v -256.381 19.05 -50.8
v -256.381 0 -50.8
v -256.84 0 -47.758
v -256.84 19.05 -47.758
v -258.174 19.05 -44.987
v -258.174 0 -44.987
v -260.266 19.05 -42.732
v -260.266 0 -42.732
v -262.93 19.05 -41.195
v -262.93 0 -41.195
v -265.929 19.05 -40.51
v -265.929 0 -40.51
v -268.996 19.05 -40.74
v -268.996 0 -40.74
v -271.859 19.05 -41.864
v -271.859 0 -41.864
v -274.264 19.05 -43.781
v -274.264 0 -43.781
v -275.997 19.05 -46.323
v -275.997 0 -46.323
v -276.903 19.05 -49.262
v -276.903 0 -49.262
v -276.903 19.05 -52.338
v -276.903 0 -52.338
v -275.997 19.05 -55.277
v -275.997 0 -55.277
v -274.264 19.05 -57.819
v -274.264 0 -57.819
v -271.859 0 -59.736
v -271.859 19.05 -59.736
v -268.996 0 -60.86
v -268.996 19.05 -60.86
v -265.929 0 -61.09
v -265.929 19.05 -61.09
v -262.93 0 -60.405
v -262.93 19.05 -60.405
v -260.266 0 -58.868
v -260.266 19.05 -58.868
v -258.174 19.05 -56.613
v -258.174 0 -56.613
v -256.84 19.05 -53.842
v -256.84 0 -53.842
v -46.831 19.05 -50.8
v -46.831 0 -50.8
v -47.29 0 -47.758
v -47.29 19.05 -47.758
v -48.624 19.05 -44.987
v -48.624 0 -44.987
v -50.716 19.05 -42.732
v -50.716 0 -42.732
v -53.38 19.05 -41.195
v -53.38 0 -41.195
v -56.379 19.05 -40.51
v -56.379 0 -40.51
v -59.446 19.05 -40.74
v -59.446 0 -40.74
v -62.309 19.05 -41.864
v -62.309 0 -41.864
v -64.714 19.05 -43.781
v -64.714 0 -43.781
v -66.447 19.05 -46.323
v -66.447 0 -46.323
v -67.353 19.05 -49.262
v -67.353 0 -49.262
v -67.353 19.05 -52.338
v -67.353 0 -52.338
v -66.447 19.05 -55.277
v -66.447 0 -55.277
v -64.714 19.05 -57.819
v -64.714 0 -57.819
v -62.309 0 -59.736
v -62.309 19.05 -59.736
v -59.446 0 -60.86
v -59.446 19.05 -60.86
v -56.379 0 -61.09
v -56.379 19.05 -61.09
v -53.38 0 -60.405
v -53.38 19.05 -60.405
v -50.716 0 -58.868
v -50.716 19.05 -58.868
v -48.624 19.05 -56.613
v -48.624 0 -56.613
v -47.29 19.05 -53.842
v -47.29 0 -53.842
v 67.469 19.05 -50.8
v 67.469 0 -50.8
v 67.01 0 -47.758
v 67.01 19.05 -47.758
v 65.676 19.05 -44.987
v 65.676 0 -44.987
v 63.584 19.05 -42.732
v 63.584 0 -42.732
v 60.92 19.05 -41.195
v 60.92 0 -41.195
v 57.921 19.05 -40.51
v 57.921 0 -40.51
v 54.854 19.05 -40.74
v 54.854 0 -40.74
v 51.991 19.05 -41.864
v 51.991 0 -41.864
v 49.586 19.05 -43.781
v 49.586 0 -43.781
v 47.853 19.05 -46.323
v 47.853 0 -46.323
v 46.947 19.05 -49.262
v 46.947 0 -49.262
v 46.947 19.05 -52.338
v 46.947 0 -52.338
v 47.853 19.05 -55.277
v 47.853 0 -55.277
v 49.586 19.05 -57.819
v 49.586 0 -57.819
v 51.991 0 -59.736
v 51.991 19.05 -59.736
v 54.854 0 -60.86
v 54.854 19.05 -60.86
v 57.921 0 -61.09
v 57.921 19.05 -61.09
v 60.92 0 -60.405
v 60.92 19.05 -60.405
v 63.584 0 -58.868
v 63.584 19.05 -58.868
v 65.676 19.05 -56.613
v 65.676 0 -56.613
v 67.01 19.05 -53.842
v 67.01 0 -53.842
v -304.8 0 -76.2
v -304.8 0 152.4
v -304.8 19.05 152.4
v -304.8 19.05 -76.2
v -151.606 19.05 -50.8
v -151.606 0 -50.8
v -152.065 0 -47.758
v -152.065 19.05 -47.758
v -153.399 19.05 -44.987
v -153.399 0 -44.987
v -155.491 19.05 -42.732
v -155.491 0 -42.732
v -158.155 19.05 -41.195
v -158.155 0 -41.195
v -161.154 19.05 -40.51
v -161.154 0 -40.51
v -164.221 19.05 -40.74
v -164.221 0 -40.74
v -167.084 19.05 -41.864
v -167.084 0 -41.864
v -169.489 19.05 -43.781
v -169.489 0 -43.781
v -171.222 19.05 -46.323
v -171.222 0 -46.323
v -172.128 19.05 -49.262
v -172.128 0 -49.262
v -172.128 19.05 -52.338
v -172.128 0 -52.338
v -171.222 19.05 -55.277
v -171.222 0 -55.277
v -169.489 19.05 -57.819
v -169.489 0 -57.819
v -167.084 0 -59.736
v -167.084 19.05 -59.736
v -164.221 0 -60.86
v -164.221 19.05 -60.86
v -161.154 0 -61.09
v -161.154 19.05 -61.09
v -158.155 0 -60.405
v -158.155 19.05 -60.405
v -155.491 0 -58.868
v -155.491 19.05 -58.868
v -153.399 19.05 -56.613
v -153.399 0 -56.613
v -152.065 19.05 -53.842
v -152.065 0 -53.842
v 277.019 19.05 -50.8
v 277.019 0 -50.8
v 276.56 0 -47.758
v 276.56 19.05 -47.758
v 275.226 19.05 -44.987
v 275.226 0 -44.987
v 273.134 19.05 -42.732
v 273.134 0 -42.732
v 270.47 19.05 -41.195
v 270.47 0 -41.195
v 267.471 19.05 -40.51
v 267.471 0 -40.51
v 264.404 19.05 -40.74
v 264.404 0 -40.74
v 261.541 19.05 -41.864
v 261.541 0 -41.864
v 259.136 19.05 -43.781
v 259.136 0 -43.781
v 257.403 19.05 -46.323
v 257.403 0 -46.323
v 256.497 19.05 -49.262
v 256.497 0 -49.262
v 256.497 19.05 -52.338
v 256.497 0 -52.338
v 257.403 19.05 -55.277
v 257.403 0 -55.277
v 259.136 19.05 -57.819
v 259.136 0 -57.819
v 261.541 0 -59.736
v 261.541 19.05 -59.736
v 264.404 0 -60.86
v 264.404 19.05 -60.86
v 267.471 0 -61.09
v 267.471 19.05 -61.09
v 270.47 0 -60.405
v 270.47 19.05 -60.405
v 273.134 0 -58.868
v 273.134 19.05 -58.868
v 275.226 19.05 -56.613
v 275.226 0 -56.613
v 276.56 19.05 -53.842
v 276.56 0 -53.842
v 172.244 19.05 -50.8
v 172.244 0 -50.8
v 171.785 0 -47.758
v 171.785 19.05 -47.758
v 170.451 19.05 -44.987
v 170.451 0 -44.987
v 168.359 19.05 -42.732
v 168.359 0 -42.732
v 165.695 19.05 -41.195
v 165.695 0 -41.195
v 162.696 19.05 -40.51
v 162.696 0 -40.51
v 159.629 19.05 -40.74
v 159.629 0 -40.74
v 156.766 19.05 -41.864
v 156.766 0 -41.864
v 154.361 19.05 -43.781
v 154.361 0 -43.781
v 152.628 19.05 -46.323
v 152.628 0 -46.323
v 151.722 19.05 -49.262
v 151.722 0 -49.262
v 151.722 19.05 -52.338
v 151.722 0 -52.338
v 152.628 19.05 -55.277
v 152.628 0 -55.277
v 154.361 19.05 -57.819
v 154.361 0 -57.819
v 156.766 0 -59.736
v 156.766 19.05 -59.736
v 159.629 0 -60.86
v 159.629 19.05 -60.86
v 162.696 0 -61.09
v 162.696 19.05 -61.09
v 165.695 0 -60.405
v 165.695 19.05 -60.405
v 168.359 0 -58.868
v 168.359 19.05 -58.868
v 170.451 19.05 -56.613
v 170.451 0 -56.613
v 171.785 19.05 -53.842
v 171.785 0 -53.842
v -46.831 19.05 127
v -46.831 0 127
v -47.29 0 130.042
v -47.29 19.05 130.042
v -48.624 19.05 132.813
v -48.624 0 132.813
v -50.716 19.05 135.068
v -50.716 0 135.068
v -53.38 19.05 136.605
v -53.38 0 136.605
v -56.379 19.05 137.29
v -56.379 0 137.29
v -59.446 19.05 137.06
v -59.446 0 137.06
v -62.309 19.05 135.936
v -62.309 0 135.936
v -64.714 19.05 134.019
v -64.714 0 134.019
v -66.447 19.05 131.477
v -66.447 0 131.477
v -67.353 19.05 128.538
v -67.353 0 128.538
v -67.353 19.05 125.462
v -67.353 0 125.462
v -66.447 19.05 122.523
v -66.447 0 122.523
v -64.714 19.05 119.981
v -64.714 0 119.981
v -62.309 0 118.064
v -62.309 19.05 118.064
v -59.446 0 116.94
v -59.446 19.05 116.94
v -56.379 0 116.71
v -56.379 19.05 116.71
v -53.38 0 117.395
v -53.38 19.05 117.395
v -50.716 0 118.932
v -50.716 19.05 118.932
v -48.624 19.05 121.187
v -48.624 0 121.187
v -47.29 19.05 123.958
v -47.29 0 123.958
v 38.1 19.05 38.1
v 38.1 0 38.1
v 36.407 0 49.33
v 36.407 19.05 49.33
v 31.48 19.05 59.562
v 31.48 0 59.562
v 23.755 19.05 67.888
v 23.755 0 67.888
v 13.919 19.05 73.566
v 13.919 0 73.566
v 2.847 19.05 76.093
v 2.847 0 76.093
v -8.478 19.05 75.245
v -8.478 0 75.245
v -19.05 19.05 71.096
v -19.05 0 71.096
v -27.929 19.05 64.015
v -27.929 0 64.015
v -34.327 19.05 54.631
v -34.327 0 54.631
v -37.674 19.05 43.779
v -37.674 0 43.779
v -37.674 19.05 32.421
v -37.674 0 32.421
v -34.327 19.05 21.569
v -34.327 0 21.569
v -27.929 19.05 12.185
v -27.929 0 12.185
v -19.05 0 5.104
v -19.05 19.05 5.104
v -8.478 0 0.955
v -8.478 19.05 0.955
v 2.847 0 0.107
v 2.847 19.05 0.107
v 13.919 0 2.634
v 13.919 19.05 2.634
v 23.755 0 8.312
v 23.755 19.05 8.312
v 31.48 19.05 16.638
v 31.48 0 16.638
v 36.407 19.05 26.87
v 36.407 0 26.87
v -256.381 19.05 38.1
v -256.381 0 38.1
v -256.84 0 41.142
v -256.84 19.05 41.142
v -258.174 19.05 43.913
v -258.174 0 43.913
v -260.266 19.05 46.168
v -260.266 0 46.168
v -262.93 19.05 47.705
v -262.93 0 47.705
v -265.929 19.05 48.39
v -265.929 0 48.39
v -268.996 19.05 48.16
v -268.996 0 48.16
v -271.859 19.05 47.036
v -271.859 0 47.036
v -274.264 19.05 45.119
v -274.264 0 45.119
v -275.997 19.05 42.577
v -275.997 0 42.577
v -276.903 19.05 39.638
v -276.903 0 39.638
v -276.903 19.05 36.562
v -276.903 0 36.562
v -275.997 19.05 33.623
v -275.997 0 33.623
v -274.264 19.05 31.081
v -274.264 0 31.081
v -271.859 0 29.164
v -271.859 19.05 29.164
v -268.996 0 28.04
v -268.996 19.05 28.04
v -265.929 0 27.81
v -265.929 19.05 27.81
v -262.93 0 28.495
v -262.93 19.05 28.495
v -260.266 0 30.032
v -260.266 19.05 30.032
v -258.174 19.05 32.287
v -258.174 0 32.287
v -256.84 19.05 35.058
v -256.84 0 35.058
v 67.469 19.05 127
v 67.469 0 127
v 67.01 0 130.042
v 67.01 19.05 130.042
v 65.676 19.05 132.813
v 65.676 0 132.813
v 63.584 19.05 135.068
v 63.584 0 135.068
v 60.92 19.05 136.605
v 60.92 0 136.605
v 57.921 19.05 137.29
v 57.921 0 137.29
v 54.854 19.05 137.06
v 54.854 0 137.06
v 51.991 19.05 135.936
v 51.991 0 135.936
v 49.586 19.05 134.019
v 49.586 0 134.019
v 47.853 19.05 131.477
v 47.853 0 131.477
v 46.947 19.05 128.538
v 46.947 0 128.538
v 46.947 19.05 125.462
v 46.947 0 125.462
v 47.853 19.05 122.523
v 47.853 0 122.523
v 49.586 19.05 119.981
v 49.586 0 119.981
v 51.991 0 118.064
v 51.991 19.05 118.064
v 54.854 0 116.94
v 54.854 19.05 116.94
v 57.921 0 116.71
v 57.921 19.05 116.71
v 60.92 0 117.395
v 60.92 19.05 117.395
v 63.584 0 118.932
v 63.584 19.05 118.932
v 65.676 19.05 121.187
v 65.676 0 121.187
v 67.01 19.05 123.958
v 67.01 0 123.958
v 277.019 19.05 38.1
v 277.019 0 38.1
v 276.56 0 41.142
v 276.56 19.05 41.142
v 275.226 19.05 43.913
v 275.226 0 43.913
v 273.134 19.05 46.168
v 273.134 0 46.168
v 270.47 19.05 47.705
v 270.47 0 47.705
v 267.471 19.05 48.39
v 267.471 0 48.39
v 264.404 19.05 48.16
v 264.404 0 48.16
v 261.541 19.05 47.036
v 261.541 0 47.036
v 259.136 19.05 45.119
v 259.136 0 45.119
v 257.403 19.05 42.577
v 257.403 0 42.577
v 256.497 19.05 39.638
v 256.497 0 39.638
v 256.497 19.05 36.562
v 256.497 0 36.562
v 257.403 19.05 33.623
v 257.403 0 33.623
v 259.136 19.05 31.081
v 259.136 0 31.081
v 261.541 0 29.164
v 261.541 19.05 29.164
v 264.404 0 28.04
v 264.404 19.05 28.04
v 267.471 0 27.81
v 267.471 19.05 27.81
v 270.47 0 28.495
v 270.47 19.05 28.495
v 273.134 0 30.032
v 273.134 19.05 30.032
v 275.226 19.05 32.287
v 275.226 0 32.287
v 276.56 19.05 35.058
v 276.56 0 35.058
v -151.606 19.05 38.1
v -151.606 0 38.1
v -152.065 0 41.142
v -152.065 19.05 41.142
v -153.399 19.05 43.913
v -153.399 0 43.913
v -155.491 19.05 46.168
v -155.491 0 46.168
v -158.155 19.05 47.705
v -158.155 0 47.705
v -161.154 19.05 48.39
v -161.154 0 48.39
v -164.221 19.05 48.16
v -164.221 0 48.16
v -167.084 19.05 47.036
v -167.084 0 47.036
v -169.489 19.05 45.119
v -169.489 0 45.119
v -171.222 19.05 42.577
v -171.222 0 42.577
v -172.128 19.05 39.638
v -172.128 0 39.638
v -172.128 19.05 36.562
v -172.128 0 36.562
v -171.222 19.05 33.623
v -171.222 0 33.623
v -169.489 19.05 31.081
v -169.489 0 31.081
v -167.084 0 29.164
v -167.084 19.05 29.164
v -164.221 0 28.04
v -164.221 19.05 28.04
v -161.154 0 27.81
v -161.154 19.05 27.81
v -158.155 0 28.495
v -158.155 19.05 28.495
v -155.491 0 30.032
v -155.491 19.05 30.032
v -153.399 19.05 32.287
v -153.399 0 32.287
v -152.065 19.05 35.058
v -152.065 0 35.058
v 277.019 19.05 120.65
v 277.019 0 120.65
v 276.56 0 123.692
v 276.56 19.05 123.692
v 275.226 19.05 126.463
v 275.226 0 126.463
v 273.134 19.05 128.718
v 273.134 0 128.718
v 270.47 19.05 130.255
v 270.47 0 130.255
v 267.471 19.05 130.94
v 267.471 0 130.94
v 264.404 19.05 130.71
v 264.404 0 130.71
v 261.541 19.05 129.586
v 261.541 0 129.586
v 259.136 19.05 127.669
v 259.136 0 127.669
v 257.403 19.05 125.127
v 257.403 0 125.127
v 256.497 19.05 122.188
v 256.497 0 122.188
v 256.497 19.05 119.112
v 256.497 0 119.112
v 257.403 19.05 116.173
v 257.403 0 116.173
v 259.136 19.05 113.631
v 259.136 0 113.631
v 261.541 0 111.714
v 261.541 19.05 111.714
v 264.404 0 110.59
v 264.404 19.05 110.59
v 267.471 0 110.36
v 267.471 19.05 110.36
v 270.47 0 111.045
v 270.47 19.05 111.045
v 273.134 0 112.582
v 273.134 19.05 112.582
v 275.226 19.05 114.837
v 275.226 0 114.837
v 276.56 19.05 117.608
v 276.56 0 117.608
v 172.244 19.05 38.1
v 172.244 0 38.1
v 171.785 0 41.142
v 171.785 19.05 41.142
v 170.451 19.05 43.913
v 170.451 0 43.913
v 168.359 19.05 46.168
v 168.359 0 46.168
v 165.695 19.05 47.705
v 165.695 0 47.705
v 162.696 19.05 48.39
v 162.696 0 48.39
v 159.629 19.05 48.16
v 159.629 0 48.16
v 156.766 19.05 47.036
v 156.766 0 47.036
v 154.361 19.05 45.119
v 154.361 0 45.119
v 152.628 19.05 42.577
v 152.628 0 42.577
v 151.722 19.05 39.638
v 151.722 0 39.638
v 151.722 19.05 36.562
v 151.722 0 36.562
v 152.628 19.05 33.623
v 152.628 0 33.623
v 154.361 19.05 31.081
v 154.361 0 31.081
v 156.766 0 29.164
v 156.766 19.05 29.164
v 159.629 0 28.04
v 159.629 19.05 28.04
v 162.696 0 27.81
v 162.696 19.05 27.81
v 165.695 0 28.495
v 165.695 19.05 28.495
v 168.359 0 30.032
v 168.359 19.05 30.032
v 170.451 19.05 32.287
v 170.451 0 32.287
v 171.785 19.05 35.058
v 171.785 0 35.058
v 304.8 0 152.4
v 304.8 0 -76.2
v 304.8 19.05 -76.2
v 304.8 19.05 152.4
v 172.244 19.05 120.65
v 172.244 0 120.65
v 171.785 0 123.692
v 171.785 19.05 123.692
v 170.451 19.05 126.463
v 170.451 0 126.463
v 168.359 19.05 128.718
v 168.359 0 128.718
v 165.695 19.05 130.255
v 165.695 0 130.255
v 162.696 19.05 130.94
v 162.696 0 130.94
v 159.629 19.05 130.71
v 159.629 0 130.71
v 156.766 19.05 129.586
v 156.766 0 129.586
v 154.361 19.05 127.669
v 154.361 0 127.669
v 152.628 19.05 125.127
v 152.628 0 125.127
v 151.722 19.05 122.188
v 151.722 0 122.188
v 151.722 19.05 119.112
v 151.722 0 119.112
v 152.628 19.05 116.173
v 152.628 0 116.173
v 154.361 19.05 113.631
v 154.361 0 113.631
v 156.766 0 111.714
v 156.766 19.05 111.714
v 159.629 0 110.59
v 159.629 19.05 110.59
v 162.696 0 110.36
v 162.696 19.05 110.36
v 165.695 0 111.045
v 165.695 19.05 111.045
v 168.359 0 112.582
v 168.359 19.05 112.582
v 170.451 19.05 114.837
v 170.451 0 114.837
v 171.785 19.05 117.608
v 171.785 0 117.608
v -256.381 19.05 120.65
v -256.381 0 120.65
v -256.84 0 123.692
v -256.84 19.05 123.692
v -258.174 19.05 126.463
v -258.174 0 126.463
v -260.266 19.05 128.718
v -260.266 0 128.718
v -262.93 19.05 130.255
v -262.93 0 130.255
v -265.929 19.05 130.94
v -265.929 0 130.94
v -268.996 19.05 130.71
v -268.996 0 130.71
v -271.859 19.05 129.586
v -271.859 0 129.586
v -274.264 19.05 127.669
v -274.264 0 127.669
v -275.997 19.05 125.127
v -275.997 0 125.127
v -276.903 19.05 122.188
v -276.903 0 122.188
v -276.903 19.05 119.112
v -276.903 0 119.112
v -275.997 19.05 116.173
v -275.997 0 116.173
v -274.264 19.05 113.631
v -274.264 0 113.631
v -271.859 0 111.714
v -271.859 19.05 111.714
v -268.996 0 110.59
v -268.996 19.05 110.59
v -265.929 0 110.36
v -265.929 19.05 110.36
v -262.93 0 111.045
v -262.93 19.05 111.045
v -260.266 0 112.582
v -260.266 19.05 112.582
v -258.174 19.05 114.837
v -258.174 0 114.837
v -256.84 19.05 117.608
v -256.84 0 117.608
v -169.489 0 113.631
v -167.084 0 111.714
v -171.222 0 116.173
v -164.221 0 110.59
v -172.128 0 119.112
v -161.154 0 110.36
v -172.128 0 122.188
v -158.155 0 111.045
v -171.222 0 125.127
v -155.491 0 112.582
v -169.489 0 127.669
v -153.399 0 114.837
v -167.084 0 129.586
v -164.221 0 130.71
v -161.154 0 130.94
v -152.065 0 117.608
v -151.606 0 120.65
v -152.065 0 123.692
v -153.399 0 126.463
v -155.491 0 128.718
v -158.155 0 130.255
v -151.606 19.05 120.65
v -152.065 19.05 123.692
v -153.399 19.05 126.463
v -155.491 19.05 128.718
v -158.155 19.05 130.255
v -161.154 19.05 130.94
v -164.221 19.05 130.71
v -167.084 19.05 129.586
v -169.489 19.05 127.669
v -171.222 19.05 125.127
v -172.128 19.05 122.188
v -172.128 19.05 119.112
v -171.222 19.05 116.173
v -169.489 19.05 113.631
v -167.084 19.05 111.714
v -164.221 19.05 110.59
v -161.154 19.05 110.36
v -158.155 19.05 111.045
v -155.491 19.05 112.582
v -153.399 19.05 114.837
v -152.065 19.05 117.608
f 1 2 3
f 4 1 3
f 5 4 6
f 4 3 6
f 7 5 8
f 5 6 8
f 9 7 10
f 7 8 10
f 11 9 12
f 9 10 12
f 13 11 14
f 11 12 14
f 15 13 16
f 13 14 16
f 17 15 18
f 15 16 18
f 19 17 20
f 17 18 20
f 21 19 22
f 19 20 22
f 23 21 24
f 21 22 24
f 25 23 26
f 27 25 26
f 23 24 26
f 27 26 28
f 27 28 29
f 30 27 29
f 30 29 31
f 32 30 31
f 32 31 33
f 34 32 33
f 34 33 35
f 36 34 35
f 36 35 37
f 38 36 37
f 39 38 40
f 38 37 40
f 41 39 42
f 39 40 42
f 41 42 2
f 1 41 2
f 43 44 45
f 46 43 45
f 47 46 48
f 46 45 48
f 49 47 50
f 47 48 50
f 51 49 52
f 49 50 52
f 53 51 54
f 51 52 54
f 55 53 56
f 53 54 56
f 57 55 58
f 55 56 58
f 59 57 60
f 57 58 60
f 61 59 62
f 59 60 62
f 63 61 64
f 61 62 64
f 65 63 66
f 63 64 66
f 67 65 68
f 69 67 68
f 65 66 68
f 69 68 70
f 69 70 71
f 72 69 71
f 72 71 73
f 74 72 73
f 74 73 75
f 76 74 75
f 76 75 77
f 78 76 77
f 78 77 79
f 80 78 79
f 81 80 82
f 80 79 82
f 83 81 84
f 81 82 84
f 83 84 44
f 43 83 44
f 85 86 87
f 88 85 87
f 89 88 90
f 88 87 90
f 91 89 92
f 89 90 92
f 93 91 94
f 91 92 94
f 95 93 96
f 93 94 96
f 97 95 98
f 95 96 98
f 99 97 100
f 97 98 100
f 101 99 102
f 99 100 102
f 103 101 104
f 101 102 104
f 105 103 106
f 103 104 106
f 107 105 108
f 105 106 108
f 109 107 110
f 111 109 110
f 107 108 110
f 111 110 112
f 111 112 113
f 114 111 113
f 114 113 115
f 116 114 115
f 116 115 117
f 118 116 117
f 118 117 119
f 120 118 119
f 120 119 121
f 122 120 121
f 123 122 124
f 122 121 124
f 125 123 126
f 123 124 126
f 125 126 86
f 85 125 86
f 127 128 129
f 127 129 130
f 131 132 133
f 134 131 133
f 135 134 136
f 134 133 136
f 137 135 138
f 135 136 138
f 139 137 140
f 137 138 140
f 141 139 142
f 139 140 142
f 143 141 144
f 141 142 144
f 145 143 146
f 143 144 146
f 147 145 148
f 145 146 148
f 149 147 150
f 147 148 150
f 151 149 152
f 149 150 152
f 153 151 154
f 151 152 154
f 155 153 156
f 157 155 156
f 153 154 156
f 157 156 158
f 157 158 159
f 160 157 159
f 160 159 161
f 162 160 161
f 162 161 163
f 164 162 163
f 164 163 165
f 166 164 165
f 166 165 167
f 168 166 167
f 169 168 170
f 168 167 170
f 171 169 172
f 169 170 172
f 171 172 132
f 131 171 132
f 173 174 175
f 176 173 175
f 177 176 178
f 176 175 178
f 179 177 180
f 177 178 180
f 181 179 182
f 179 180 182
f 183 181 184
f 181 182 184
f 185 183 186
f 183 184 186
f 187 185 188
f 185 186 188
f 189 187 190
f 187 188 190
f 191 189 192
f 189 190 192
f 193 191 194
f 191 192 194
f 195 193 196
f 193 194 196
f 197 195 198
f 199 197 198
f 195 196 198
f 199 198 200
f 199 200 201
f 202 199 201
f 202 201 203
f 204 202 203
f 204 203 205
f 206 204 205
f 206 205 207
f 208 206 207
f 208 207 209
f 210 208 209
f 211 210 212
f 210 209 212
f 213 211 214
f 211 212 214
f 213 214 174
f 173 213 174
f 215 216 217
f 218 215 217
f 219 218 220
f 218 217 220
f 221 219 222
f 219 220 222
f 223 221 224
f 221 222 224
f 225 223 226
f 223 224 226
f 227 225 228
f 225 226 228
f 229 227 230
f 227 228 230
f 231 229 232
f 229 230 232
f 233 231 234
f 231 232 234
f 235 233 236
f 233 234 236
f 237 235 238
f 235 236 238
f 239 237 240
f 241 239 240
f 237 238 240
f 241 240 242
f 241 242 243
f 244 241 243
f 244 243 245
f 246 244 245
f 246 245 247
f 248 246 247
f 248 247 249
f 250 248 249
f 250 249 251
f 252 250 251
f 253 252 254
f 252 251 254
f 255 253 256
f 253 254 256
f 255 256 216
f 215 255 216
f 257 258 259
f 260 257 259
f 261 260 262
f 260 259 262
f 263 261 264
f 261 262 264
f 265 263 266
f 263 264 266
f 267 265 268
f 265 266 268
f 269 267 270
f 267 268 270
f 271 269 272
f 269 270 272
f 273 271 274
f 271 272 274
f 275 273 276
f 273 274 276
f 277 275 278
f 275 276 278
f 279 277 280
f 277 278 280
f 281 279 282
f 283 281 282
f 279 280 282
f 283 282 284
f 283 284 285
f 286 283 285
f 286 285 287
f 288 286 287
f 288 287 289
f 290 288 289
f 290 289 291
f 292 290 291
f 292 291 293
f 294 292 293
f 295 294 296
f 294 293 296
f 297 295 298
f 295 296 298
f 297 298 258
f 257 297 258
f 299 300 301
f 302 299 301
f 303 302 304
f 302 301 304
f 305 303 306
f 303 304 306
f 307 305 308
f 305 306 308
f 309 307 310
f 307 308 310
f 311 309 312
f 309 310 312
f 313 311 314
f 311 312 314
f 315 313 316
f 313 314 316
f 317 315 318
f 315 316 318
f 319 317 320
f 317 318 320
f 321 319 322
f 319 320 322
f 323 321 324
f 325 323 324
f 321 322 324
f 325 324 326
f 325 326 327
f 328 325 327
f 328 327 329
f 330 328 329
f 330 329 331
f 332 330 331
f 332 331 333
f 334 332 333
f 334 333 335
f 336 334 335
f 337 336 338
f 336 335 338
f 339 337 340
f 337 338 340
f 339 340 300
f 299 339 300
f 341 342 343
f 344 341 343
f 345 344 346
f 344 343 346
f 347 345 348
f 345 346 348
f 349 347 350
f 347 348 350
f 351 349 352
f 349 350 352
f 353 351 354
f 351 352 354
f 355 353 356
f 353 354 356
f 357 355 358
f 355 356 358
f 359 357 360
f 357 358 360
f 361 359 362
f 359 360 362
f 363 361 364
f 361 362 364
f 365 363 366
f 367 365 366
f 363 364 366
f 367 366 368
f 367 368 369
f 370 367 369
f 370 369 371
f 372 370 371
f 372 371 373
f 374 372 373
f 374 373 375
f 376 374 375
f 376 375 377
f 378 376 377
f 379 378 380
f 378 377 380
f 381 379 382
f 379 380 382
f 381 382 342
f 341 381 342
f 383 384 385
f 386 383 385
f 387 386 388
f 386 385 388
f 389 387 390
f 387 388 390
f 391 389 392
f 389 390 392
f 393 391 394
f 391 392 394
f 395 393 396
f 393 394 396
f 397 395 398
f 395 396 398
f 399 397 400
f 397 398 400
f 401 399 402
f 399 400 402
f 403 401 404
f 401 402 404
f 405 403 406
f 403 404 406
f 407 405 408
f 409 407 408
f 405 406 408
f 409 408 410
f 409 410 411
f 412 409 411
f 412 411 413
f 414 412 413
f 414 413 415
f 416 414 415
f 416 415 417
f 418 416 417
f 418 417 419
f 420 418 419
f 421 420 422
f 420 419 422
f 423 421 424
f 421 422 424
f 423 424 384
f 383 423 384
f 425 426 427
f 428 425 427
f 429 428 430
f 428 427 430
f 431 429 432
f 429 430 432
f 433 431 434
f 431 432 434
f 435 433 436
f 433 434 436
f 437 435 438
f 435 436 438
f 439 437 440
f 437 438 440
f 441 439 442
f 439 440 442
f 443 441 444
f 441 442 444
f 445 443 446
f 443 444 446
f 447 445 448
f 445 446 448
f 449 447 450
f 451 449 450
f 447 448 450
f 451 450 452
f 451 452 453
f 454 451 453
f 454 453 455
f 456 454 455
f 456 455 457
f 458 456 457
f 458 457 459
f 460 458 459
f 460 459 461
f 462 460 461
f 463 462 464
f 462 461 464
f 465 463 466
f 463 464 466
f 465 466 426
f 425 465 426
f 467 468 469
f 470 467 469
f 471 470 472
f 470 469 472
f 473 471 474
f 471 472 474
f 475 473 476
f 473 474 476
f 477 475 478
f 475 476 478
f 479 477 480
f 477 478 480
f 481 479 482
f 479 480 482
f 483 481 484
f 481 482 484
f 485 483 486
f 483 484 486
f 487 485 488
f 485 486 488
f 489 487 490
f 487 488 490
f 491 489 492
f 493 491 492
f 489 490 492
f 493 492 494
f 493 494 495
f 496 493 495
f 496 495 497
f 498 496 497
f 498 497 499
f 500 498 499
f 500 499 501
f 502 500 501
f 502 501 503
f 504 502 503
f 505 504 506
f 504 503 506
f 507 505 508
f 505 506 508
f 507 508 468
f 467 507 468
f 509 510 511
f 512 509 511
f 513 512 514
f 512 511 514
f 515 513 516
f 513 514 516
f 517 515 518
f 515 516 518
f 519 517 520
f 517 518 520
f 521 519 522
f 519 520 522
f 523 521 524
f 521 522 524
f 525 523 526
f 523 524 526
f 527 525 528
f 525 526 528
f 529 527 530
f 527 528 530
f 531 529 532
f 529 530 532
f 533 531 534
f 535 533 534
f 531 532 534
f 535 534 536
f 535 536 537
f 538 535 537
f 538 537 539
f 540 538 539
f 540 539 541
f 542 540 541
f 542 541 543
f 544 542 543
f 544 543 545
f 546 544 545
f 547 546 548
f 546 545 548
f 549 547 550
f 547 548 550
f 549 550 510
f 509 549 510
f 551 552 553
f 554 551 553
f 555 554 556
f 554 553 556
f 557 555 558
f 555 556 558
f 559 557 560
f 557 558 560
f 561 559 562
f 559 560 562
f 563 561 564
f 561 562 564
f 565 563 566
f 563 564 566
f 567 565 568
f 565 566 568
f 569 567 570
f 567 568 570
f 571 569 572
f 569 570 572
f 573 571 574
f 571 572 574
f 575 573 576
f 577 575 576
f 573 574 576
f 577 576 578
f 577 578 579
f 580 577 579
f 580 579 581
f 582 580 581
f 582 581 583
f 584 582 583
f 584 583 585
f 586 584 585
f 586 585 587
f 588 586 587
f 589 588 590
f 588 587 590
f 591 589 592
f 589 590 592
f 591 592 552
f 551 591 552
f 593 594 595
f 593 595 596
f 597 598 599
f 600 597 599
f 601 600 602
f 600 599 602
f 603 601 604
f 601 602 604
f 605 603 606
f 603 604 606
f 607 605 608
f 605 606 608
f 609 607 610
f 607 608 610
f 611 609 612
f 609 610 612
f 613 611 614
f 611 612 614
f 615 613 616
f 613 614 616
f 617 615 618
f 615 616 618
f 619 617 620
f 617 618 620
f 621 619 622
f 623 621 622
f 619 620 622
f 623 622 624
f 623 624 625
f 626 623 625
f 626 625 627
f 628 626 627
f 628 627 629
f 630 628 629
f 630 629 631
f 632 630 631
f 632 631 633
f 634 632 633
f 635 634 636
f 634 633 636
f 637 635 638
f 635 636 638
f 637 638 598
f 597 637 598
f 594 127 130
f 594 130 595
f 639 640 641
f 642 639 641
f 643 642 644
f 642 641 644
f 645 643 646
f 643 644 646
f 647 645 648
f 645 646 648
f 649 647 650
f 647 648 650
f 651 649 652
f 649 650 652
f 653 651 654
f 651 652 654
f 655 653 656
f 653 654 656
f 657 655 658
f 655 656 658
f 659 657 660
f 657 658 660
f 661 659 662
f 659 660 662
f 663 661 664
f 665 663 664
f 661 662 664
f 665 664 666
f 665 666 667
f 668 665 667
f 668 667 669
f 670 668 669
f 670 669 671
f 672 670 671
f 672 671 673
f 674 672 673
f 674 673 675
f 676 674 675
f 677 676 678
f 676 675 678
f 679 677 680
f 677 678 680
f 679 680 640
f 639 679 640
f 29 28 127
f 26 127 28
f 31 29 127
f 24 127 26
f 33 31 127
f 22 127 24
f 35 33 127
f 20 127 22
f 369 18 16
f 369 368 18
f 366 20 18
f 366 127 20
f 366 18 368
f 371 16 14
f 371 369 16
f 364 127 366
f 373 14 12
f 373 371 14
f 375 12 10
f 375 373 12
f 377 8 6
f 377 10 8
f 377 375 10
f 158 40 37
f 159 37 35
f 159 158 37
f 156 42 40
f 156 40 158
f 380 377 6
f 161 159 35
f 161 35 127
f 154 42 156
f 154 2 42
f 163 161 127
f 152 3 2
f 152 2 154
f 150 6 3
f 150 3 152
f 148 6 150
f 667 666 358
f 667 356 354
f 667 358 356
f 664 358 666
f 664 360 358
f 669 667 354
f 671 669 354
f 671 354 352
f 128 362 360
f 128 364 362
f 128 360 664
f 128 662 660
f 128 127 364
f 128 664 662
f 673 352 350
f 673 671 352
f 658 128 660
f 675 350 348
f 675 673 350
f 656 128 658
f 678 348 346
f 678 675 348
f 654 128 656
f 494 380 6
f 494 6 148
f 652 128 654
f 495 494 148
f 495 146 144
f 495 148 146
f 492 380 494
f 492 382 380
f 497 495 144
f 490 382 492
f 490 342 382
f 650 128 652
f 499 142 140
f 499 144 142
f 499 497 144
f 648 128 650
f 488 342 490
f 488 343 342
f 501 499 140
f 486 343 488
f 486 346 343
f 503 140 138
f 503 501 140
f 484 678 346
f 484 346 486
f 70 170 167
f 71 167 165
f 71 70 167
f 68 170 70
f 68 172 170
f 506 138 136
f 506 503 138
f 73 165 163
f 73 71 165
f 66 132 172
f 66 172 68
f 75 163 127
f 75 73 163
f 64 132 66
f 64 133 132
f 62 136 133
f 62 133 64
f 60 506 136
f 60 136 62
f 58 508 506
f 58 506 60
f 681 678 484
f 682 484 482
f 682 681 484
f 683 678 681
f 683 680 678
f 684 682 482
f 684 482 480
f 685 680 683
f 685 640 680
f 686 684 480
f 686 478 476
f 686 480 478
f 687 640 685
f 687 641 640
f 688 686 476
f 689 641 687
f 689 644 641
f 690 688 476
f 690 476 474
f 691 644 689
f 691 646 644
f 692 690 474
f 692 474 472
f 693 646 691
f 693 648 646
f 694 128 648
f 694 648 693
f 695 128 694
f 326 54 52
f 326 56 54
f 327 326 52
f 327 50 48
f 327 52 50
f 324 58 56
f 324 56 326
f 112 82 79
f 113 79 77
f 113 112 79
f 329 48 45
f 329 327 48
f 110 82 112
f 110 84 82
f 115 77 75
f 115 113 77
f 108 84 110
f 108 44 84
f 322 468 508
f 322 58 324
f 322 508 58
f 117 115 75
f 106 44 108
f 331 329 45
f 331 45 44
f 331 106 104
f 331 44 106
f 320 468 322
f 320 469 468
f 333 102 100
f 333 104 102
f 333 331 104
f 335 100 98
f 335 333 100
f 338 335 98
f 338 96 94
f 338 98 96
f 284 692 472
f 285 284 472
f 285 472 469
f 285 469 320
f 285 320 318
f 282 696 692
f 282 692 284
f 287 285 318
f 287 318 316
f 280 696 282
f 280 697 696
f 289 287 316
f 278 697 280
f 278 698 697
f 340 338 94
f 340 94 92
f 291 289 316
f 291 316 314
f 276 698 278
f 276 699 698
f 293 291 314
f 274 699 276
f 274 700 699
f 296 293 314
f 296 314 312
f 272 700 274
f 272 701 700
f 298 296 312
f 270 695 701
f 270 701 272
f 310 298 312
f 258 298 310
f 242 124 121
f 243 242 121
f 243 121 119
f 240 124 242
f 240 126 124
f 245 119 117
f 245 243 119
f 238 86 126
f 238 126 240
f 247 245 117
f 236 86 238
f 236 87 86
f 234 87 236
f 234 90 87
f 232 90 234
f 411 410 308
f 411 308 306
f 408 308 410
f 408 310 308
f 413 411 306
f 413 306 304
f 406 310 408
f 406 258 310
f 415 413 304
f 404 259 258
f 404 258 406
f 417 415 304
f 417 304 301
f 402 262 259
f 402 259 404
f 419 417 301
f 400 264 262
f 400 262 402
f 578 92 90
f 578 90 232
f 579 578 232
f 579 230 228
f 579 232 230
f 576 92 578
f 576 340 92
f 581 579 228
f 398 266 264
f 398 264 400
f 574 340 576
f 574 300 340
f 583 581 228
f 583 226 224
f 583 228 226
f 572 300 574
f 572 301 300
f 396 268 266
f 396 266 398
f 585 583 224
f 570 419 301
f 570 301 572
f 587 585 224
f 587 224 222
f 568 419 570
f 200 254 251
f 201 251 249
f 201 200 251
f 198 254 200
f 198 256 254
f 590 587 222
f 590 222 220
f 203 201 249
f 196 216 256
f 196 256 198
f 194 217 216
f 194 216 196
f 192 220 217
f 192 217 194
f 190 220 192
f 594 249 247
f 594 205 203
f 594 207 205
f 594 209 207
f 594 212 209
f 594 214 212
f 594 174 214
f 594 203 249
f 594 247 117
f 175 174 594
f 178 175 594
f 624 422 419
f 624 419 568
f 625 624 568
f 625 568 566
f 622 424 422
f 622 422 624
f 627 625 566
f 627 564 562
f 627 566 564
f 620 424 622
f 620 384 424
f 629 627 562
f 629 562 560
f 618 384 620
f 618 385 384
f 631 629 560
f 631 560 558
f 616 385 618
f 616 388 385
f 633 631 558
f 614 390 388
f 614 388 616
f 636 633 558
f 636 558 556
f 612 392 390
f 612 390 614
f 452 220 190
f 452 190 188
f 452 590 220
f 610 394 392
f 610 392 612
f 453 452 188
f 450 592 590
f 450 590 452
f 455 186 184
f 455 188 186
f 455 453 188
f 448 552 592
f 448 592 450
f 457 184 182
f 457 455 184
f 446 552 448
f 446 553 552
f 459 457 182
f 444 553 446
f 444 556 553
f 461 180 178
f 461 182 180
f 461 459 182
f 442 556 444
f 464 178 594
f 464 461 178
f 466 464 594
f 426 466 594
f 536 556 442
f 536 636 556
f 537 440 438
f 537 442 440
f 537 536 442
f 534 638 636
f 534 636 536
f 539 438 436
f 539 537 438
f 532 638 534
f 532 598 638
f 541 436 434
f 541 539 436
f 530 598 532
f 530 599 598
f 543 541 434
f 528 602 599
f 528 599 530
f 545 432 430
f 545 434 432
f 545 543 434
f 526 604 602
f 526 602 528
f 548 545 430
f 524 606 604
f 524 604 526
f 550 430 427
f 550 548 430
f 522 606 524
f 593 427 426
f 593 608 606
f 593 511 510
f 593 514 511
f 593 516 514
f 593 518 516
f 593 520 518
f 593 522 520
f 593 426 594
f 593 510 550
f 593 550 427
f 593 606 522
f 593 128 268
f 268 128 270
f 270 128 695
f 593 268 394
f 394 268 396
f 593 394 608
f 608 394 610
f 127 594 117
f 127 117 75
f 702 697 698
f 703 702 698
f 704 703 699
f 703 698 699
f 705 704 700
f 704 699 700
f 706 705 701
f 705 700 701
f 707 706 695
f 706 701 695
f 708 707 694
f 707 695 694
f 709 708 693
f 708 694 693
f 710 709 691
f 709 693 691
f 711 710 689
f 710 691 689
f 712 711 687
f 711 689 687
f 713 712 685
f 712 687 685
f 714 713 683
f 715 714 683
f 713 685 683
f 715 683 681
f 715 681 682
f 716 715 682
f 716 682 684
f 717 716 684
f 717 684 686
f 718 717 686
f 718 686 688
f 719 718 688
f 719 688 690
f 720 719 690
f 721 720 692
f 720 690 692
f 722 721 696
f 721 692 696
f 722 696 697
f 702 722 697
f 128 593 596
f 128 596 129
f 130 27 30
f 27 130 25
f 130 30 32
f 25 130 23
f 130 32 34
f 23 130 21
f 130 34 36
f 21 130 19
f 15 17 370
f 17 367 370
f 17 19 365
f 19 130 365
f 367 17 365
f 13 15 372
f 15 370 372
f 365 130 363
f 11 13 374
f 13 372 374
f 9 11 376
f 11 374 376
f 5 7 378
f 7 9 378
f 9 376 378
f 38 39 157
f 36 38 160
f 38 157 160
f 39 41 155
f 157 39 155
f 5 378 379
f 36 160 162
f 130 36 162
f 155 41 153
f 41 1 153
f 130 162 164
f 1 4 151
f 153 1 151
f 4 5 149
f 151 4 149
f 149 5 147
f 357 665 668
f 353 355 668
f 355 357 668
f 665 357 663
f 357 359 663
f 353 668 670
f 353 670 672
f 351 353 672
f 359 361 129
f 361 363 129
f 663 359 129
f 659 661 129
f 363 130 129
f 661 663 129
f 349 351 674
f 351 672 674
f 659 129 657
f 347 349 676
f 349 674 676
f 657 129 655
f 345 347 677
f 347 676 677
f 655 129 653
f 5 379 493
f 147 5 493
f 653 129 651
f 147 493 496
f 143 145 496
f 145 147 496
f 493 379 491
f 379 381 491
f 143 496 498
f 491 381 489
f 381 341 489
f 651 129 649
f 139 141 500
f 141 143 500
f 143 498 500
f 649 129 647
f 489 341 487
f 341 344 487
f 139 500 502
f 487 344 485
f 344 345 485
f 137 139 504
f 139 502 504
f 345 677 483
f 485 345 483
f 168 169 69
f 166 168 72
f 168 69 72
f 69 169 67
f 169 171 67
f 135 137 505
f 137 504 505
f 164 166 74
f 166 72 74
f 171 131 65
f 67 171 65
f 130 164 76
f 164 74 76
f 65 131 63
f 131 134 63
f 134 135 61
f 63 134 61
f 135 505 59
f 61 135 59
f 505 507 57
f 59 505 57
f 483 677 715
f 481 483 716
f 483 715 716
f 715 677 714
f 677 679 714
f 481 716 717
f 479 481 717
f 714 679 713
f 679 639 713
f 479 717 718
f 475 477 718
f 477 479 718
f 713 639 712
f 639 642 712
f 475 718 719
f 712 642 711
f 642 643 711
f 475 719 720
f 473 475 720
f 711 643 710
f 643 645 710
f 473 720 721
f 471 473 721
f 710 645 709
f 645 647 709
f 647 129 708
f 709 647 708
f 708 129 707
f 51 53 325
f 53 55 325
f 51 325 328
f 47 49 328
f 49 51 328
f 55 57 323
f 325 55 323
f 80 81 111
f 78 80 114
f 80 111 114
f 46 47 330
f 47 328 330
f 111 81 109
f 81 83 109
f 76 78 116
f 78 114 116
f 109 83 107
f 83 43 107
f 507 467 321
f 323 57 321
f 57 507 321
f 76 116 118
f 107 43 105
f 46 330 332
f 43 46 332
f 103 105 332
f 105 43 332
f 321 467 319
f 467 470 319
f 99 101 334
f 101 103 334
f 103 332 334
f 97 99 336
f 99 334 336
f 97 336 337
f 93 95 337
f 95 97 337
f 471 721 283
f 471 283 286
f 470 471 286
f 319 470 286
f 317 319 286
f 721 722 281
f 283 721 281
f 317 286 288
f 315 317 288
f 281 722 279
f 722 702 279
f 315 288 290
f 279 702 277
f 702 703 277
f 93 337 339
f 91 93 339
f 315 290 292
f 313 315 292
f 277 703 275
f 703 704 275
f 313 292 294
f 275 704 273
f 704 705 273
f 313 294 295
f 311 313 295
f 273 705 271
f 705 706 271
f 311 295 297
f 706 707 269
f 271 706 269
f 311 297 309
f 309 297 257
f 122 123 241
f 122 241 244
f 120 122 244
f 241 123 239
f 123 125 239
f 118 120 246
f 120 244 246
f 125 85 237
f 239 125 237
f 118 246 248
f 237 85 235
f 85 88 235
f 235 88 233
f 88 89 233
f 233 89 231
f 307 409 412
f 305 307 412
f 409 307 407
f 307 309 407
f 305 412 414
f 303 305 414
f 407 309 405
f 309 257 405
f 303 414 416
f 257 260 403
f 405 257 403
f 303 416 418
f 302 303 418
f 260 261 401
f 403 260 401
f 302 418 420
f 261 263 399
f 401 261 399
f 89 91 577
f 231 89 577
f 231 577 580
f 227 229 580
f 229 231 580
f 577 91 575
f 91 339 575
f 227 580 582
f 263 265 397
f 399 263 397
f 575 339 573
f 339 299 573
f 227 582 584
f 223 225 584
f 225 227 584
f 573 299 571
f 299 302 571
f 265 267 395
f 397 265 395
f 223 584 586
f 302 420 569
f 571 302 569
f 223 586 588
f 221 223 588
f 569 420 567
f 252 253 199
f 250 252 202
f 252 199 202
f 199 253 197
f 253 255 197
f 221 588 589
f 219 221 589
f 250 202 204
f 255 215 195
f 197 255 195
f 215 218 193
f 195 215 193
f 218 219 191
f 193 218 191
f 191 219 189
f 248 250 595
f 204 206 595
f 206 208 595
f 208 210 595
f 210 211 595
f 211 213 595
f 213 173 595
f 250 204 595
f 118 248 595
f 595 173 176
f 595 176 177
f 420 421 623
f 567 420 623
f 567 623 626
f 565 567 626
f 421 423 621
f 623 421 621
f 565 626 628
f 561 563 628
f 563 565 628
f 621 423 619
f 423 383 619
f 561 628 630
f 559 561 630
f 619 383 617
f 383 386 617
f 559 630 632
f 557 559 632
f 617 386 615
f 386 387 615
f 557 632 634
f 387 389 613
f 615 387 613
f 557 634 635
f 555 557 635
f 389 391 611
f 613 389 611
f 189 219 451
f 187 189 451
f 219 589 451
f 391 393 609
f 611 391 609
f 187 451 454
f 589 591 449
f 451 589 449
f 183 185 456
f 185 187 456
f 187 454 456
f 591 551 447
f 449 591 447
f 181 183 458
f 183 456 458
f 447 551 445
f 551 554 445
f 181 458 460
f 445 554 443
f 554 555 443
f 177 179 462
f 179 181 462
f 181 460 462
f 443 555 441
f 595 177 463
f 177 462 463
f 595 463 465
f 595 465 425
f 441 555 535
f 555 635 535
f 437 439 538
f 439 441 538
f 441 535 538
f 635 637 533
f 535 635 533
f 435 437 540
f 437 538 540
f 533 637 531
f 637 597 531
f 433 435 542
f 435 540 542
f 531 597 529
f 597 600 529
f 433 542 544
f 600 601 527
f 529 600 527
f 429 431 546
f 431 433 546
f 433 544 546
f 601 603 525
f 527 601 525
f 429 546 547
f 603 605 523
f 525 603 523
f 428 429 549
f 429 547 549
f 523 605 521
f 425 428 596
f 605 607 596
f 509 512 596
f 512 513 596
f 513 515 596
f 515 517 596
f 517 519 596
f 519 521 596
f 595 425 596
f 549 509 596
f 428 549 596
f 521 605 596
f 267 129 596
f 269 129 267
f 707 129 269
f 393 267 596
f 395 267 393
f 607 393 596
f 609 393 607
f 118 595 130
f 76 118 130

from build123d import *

# Parameters (mm, degrees)
F0_R     = 10.31875
F0_R_2   = 38.1
F1_DEPTH = 19.05


with BuildPart() as f1:
    # F0 (on Front) → F1 (new body)
    with BuildSketch(Plane.XZ):
        with BuildLine():
            ThreePointArc((31.590851, 85.725), (0, -19.05), (-31.590851, 85.725))
            Line((-31.590851, 85.725), (-304.8, 85.725))
            Line((-304.8, 85.725), (-304.8, -76.2))
            Line((-304.8, -76.2), (295.275, -76.2))
            Line((295.275, -76.2), (295.275, 76.2))
            ThreePointArc((295.275, 76.2), (292.485192, 82.935192), (285.75, 85.725))
            Line((285.75, 85.725), (31.590851, 85.725))
        make_face()
        with Locations((-266.7, -50.8)):
            Circle(F0_R, mode=Mode.SUBTRACT)
        with Locations((-161.925, -50.8)):
            Circle(F0_R, mode=Mode.SUBTRACT)
        with Locations((-57.15, -50.8)):
            Circle(F0_R, mode=Mode.SUBTRACT)
        with Locations((57.15, -50.8)):
            Circle(F0_R, mode=Mode.SUBTRACT)
        with Locations((161.925, -50.8)):
            Circle(F0_R, mode=Mode.SUBTRACT)
        with Locations((-266.7, 38.1)):
            Circle(F0_R, mode=Mode.SUBTRACT)
        with Locations((-161.925, 38.1)):
            Circle(F0_R, mode=Mode.SUBTRACT)
        with Locations((161.925, 38.1)):
            Circle(F0_R, mode=Mode.SUBTRACT)
        with Locations((266.7, -50.8)):
            Circle(F0_R, mode=Mode.SUBTRACT)
        with Locations((266.7, 38.1)):
            Circle(F0_R, mode=Mode.SUBTRACT)
        with BuildLine():
            Line((0, 85.725), (-31.590851, 85.725))
            ThreePointArc((-31.590851, 85.725), (0, -19.05), (31.590851, 85.725))
            Line((31.590851, 85.725), (0, 85.725))
        make_face()
        with Locations((0, 38.1)):
            Circle(F0_R_2, mode=Mode.SUBTRACT)
        Polygon((-304.8, 152.4), (-304.8, 95.25), (0, 95.25), (304.8, 95.25), (304.8, 152.4), align=None)
        with Locations((-266.7, 120.65)):
            Circle(F0_R, mode=Mode.SUBTRACT)
        with Locations((-161.925, 120.65)):
            Circle(F0_R, mode=Mode.SUBTRACT)
        with Locations((-57.15, 127)):
            Circle(F0_R, mode=Mode.SUBTRACT)
        with Locations((57.15, 127)):
            Circle(F0_R, mode=Mode.SUBTRACT)
        with Locations((161.925, 120.65)):
            Circle(F0_R, mode=Mode.SUBTRACT)
        with Locations((266.7, 120.65)):
            Circle(F0_R, mode=Mode.SUBTRACT)
        Polygon((-304.8, 85.725), (-31.590851, 85.725), (0, 85.725), (31.590851, 85.725), (285.75, 85.725), (304.8, 85.725), (304.8, 95.25), (0, 95.25), (-304.8, 95.25), align=None)
        with BuildLine():
            Line((304.8, 85.725), (285.75, 85.725))
            ThreePointArc((285.75, 85.725), (292.485192, 82.935192), (295.275, 76.2))
            Line((295.275, 76.2), (295.275, -76.2))
            Line((295.275, -76.2), (304.8, -76.2))
            Line((304.8, -76.2), (304.8, 47.625))
            Line((304.8, 47.625), (304.8, 85.725))
        make_face()
    extrude(amount=-F1_DEPTH)


solid = f1.part
